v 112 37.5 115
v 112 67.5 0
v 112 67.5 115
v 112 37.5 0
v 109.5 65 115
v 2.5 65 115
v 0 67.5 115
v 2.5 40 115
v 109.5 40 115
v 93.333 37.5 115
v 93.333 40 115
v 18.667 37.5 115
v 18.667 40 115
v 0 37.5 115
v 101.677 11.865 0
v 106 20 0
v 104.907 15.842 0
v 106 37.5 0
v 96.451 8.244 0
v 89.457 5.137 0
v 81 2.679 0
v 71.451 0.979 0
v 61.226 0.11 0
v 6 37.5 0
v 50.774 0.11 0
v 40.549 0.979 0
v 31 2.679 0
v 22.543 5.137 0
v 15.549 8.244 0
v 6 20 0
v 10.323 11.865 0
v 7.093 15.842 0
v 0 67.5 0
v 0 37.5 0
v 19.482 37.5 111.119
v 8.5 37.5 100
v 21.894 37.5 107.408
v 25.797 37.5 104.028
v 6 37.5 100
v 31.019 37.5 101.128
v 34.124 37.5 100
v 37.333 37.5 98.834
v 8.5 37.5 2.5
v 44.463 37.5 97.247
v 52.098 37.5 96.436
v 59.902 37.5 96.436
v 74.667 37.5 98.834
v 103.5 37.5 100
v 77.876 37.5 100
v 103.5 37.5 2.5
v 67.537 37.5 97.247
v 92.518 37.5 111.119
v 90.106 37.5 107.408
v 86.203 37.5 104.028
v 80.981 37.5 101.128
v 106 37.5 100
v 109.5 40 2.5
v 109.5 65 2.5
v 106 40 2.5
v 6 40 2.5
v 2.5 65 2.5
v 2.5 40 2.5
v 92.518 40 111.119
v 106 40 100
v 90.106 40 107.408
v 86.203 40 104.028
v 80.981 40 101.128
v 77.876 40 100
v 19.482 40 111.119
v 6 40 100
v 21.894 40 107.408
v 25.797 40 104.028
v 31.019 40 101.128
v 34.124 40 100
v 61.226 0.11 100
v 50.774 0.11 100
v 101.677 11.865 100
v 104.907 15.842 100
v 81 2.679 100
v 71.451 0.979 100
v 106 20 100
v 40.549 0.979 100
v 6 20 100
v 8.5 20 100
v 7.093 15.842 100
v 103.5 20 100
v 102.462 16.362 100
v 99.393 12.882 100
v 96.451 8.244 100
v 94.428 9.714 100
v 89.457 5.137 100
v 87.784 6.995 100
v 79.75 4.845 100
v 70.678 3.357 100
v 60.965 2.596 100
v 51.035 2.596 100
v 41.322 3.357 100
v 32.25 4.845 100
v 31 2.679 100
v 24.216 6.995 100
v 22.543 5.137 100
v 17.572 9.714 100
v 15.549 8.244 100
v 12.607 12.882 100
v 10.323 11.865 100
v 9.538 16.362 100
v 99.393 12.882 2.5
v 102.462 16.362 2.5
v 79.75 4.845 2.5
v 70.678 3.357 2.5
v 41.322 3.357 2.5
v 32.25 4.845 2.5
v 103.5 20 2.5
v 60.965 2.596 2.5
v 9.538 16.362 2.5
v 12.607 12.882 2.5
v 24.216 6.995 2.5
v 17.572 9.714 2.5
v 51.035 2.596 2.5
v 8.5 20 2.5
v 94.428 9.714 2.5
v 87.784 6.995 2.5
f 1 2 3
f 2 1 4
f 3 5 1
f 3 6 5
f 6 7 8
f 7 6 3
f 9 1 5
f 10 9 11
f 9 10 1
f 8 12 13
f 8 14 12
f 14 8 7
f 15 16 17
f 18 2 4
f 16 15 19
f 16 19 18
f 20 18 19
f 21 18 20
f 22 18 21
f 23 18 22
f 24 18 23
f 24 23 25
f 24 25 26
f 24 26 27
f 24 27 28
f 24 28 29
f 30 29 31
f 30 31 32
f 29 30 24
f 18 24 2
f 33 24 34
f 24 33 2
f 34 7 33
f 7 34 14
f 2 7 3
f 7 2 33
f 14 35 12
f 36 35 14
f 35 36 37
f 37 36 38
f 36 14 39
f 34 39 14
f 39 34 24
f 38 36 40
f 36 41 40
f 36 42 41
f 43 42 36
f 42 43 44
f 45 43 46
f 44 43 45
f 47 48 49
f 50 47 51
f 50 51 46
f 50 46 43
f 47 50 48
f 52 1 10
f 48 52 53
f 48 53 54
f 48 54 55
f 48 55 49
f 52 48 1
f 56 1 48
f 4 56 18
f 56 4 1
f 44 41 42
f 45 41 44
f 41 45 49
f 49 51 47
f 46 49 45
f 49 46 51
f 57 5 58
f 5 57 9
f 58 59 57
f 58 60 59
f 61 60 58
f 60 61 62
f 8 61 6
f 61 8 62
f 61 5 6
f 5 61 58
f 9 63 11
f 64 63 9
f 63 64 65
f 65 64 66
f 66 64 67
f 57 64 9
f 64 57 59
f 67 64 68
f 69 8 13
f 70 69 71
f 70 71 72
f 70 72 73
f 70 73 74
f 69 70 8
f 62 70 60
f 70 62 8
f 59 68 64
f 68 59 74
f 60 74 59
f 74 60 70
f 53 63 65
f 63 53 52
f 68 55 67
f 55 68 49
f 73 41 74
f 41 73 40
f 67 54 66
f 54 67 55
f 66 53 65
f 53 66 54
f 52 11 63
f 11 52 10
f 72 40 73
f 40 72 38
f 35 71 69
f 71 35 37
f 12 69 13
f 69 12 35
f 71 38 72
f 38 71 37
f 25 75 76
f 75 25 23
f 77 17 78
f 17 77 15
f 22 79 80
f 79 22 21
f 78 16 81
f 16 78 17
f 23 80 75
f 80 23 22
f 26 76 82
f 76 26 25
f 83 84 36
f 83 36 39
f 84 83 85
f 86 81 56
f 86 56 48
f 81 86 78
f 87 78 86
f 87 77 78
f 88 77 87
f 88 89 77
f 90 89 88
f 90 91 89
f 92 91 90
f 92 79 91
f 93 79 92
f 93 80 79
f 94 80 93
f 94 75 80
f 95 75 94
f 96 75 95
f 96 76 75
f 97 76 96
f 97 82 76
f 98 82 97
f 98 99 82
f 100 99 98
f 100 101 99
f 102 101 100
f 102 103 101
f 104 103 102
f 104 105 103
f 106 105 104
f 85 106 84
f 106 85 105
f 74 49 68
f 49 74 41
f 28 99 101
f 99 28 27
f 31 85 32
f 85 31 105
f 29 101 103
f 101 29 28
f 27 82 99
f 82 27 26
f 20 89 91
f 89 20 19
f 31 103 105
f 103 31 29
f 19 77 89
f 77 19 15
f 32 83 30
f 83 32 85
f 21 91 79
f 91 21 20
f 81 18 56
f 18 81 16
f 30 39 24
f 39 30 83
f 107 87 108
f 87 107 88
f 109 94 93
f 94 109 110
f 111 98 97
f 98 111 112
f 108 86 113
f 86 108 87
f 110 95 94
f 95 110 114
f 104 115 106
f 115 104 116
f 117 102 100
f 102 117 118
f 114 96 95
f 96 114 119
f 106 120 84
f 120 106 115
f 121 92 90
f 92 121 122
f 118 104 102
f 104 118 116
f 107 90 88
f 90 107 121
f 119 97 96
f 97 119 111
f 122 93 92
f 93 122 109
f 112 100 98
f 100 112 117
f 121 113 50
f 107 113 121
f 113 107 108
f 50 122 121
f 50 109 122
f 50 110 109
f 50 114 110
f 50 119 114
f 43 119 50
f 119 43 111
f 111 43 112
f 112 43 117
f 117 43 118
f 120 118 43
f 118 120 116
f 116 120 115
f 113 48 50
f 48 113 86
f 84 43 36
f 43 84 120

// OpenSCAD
paper_holder_width=112;
paper_holder_depth=30;
paper_holder_height=115;

pencil_holder_width=100;
pencil_holder_depth=40;
pencil_holder_height=100;

wall_thickness=2.5;

translate([0,pencil_holder_depth-wall_thickness,0]) paper_holder(paper_holder_width,paper_holder_depth,paper_holder_height,wall_thickness);
translate([(paper_holder_width-pencil_holder_width)/2,0,0]) pencil_holder(pencil_holder_width,pencil_holder_depth,pencil_holder_height,wall_thickness);

module pencil_holder(width,depth,height,thickness) {
	difference() {
		pencil_holder_shape(width,depth,height);
		translate([thickness,thickness,thickness]) pencil_holder_shape(width-thickness*2,depth-thickness*2,height);
		
	}
}
module pencil_holder_shape(width,depth,height) {
	union() {
		translate([width/2,depth/2,0]) scale([1,depth/width,1]) cylinder(r=width/2,h=height);
		translate([0,depth/2,0]) cube([width,depth/2,height]);
	}
	
}


module paper_holder(width,depth,height,thickness) {
	difference() {
		paper_holder_shape(width,depth,height);
		translate([thickness,thickness,thickness]) paper_holder_shape(width-thickness*2,depth-thickness*2,height);
		translate([width/2,depth/2,height]) rotate(v=[1,0,0], a=90) scale([2,1,1]) cylinder(r=width/6,h=depth);
	}
}

module paper_holder_shape(width,depth,height) {
	cube([width,depth,height]);
}
